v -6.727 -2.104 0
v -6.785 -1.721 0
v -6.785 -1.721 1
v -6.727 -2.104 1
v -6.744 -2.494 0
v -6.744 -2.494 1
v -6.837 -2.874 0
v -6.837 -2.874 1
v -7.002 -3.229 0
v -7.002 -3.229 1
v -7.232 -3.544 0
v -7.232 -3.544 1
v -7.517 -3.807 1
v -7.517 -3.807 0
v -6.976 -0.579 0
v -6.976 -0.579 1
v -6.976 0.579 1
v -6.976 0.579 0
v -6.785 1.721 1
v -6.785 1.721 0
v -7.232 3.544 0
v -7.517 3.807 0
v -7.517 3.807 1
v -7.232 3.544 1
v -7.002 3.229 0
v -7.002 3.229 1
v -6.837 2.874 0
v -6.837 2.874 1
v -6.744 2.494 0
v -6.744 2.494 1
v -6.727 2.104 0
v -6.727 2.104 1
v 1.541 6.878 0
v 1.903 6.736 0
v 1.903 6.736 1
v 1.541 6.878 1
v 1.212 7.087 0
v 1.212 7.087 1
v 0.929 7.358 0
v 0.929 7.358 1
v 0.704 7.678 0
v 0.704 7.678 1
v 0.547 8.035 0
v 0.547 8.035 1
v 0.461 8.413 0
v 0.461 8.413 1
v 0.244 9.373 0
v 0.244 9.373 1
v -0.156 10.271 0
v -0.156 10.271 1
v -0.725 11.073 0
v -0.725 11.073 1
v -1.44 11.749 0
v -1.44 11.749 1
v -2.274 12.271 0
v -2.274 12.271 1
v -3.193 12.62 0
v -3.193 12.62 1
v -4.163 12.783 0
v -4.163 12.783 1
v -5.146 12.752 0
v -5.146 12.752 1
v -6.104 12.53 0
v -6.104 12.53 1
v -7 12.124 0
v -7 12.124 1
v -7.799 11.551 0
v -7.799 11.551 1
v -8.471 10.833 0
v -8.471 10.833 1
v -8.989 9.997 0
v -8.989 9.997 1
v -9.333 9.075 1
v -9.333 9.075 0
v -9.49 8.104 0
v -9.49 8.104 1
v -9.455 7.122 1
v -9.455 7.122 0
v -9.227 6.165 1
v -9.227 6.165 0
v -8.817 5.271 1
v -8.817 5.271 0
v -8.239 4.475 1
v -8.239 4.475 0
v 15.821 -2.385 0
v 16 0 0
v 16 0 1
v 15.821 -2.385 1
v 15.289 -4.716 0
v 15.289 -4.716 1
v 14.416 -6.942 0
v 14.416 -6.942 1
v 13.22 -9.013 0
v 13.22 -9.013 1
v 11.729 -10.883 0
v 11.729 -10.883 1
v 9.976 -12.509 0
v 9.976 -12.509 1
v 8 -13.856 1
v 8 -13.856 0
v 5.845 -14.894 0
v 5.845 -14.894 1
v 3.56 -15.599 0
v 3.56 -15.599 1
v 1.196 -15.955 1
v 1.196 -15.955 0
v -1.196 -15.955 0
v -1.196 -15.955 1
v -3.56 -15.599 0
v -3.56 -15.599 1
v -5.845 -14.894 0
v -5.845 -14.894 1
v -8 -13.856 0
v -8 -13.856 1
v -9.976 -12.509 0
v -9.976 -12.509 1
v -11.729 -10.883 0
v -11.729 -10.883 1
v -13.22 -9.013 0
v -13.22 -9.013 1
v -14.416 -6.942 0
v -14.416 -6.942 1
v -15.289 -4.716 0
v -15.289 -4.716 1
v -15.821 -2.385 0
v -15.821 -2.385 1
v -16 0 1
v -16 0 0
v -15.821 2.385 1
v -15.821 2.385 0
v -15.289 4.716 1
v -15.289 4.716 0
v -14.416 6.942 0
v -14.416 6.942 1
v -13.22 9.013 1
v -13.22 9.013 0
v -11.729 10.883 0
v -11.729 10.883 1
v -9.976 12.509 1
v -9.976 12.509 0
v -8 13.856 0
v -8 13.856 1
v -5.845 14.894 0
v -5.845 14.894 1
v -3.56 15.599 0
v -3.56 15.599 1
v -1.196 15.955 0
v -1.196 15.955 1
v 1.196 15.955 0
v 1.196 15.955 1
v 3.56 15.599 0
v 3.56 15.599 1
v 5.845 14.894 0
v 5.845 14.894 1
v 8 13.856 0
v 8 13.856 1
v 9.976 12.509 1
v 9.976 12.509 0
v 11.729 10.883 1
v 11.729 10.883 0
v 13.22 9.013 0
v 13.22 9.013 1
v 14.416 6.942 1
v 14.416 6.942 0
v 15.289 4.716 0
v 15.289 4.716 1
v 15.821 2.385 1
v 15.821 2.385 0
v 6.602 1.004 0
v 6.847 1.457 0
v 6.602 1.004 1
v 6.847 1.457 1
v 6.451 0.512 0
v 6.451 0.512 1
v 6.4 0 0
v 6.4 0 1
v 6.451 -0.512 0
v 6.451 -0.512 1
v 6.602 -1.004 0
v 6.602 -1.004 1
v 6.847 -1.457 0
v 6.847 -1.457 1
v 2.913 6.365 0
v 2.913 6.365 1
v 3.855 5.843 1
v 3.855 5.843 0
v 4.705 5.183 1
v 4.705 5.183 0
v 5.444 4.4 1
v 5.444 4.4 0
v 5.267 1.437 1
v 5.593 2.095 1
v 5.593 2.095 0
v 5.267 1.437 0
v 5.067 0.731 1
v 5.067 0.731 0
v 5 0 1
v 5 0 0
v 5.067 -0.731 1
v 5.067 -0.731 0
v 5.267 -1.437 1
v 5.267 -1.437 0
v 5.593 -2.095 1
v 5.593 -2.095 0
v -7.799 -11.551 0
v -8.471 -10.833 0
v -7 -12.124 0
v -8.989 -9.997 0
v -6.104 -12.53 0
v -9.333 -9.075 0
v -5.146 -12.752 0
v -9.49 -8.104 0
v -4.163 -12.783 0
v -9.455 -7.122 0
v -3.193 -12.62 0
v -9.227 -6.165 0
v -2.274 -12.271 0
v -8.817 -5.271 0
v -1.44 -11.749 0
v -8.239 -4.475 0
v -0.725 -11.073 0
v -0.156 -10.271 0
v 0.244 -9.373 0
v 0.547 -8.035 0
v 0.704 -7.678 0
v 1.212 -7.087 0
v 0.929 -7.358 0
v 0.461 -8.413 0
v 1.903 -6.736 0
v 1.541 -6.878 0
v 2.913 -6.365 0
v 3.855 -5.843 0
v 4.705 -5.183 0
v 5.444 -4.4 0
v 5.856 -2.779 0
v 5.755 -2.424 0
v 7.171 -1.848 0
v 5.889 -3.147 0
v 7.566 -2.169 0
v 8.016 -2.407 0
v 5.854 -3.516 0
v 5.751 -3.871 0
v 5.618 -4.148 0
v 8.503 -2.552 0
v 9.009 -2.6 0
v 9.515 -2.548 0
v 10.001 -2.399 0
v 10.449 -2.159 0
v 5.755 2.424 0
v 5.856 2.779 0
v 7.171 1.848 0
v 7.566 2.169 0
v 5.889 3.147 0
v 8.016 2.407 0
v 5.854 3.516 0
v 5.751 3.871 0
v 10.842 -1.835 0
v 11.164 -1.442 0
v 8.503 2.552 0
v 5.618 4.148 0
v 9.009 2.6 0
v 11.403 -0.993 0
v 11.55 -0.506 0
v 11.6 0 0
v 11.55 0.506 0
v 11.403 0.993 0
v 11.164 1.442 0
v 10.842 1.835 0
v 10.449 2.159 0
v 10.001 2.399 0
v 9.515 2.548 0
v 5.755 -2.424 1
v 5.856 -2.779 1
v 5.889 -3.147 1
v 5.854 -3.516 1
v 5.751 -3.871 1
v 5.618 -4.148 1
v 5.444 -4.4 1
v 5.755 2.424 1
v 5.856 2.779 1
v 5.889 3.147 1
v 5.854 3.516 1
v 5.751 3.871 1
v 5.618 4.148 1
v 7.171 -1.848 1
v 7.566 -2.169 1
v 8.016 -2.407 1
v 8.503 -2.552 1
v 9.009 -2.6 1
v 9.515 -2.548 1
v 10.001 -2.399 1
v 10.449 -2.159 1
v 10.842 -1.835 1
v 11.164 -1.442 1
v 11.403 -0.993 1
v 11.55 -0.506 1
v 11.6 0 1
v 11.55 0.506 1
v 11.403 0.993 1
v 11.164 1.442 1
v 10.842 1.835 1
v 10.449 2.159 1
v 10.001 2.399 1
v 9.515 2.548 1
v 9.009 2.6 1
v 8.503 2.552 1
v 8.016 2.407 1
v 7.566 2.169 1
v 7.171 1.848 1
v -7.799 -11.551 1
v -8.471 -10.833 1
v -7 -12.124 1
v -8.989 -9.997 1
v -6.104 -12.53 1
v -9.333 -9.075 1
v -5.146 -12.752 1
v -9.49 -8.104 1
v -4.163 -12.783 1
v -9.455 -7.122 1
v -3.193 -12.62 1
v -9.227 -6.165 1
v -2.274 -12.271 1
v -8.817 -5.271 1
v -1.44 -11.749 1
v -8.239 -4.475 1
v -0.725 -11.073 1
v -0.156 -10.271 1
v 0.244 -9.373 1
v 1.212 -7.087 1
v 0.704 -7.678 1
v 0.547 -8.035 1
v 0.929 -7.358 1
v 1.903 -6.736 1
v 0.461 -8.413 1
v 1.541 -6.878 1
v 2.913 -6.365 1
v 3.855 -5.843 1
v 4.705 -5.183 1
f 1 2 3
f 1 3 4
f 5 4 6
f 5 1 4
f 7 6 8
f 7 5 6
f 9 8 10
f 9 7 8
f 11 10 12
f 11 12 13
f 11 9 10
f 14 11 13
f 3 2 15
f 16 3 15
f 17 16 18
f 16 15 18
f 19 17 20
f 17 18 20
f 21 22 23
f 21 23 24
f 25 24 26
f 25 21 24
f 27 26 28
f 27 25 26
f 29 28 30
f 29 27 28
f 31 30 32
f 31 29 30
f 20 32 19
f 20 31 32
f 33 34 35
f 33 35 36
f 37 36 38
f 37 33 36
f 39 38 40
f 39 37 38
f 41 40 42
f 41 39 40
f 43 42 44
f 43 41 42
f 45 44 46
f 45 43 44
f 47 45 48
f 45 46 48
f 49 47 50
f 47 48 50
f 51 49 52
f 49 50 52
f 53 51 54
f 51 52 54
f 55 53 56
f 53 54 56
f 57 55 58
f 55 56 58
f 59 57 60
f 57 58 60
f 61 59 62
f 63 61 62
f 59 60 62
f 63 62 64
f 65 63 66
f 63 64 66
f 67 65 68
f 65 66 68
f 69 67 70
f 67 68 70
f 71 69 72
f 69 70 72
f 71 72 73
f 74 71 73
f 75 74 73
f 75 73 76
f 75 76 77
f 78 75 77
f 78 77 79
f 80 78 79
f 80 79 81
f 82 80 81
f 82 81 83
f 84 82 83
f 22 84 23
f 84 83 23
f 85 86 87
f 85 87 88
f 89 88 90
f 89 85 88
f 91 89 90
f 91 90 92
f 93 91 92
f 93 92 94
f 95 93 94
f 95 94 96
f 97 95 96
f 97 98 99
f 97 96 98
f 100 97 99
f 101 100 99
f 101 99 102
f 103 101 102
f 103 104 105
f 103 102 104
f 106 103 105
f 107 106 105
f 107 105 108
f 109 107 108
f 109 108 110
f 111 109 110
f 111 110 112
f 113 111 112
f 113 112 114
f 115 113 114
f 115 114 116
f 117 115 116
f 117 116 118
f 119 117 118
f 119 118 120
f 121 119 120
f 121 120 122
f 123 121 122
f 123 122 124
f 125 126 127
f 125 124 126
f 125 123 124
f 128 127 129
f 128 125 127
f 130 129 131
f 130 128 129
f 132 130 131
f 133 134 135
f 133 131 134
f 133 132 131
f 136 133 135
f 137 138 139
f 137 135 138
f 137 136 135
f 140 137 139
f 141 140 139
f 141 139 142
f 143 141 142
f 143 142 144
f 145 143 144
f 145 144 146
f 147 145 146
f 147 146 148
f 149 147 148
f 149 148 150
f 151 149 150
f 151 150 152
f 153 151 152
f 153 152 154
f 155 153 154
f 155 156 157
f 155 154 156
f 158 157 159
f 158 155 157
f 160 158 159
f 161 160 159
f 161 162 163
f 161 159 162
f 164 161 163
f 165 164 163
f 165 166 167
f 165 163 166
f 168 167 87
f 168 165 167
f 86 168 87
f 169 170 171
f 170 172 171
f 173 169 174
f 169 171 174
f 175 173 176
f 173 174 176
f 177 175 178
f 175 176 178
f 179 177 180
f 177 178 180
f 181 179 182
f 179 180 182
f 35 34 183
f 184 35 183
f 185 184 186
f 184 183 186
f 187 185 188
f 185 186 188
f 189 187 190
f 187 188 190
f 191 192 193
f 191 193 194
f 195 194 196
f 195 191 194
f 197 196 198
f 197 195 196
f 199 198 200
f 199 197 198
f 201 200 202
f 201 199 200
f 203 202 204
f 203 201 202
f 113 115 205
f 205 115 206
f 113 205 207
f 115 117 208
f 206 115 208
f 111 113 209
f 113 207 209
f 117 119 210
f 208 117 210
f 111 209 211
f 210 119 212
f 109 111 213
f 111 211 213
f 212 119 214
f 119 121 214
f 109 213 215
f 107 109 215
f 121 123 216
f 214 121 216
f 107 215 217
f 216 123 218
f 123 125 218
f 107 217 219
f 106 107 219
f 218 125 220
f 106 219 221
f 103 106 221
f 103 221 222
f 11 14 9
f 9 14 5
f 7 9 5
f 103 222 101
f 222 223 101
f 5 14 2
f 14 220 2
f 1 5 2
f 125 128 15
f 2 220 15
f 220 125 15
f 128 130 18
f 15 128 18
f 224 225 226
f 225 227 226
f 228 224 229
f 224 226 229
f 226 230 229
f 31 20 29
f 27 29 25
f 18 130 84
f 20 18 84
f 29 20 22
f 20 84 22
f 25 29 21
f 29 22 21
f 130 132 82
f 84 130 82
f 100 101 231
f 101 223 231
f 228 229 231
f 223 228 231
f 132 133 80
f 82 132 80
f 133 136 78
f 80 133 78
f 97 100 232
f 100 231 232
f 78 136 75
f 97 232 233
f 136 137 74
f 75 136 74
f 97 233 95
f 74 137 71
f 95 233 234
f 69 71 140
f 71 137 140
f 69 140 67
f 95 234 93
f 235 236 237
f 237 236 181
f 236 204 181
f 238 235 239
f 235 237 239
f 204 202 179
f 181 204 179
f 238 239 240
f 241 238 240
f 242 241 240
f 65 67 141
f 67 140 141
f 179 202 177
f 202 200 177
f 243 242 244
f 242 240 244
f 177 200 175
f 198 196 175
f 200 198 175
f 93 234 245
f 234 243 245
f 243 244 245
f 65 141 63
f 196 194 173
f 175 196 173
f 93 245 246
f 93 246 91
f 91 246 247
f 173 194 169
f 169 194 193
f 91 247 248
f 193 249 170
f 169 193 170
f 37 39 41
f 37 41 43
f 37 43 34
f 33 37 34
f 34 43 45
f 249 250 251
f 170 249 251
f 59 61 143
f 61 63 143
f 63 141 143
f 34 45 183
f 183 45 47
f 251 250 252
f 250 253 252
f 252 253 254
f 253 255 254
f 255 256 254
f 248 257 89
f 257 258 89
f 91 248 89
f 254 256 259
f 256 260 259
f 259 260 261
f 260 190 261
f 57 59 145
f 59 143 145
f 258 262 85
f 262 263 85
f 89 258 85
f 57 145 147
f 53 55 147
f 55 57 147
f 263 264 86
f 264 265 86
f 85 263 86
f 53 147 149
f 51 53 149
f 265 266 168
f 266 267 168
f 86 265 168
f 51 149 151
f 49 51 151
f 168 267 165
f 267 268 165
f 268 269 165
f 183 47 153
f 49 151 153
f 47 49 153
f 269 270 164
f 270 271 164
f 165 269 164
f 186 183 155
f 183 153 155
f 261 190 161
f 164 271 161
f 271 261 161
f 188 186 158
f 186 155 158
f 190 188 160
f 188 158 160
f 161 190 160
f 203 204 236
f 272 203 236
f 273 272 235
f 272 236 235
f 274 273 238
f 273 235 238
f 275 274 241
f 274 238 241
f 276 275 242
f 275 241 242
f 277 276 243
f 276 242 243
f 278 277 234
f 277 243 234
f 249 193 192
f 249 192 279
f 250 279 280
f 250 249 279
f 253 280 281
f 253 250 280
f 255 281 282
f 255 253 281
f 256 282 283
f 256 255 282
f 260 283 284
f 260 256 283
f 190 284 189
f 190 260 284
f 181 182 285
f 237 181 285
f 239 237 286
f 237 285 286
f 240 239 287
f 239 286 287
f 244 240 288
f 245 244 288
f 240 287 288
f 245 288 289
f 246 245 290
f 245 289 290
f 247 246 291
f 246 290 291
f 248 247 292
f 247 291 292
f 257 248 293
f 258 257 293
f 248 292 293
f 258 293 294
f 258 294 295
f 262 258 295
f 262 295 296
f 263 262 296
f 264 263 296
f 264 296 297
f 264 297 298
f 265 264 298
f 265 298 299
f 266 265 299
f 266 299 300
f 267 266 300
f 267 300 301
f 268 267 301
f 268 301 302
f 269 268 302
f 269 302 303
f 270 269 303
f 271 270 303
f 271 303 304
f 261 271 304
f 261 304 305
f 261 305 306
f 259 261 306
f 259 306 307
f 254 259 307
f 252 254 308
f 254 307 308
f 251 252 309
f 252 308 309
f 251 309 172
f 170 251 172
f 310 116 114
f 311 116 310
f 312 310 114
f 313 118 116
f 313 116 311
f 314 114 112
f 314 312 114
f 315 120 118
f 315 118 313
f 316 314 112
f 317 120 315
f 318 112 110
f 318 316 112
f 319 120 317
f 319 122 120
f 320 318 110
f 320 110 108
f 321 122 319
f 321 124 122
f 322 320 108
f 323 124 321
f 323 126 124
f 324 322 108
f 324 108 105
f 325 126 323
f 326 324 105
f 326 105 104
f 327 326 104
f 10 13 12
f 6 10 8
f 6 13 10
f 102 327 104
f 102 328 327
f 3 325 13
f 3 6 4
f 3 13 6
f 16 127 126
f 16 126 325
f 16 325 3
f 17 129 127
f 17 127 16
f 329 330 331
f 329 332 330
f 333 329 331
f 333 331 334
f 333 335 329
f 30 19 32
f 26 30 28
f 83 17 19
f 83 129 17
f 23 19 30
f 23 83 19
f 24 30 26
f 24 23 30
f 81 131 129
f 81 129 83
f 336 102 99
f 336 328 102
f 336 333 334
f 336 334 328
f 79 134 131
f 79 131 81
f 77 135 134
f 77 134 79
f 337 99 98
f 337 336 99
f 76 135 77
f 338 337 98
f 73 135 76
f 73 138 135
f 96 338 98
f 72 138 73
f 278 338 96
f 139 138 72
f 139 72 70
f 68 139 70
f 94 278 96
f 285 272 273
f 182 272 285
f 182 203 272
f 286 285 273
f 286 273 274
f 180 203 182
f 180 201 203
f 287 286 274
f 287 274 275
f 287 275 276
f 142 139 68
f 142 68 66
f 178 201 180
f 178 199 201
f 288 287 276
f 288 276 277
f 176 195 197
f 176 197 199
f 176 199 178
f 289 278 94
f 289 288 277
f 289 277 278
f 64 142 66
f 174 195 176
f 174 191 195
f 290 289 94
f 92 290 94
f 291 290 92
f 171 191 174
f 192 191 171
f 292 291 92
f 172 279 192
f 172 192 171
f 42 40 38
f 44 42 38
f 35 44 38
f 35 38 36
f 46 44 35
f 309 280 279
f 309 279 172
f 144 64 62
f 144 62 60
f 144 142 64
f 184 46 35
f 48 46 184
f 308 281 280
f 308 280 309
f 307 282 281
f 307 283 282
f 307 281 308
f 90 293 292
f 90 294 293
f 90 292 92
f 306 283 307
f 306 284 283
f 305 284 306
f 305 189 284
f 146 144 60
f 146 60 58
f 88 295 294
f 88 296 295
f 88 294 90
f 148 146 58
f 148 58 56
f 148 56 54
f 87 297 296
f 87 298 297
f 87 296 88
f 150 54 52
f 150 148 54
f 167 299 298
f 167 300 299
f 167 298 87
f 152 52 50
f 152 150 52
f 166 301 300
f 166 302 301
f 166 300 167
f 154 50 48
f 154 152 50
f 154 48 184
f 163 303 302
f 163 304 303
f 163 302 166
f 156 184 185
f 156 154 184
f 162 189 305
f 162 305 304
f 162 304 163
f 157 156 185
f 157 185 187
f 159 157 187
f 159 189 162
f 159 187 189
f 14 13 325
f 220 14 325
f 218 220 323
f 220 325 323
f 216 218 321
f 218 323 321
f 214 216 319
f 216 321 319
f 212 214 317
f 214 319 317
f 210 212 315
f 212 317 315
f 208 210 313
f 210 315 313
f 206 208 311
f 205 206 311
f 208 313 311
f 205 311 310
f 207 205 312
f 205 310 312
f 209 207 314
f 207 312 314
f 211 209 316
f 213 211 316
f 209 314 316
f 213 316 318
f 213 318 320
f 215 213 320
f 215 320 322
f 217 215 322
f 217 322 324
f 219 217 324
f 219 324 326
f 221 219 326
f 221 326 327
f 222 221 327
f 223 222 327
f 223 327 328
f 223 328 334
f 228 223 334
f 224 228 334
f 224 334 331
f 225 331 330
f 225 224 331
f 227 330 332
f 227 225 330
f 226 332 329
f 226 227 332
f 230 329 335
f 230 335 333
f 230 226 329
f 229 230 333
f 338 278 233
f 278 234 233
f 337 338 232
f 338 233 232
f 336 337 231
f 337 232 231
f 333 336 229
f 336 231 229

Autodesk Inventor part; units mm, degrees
ref_plane "YZ Plane" through (0, 0, 0) normal (1, 0, 0) x (0, 1, 0)
ref_plane "XZ Plane" through (0, 0, 0) normal (0, 1, 0) x (-1, 0, 0)
ref_plane "XY Plane" through (0, 0, 0) normal (0, 0, 1) x (1, 0, 0)
sketch "Sketch1" plane through (0, 0, 0) normal (0, 0, 1) x (1, 0, 0)
  circle A0 centre (0, 0) radius 7
  circle A1 centre (0, 0) radius 16
  dimension "d0" = 32
  dimension "d1" = 14
extrude "Extrusion1" add sketch "Sketch1" along normal blind 1
sketch "Sketch2" plane through (0, 0, 1) normal (0, 0, 1) x (1, 0, 0)
  circle A0 centre (9, 0) radius 2.6
  point P0 (0, 0)
  dimension "d4" = 9
  dimension "d5" = 5.2
extrude "Extrusion2" cut sketch "Sketch2" against normal blind 1
pattern_circular "Circular Pattern1" count 3 over 360 about axis through (0, 0, 0) along (0, 0, 1) of "Extrusion2"
sketch "Sketch4" plane through (0, 0, 1) normal (0, 0, 1) x (1, 0, 0)
  arc A0 (-2.1614, 6.6579) -> (-4.6852, 5.2008) centre (-4.5, 7.7942) ccw projected
  circle A1 centre (-4.5, 7.7942) radius 5
  arc A2 (-4.6852, -5.2008) -> (-2.1614, -6.6579) centre (-4.5, -7.7942) ccw projected
  circle A3 centre (-4.5, -7.7942) radius 5
  point P0 (0, 0)
  dimension "d12" = 10
extrude "Extrusion3" cut sketch "Sketch4" against normal through all
sketch "Sketch5" plane through (0, 0, 1) normal (0, 0, 1) x (1, 0, 0)
  arc A0 (6.8467, -1.4571) -> (6.8467, 1.4571) centre (9, 0) ccw projected
  circle A1 centre (9, 0) radius 4
  circle A2 centre (9, 0) radius 2.6
  point P0 (0, 0)
  point P1 (6.8467, 1.4571)
  dimension "d16" = 8
extrude "Extrusion4" add sketch "Sketch5" against normal up to surface (1 mm away)
fillet "Fillet3" radius 2 6 edges at (0.4343, 6.9865, 0.5) (-6.2677, 3.1171, 0.5) (-6.2677, -3.1171, 0.5) (0.4343, -6.9865, 0.5) (6.3333, -2.9814, 0.5) (6.3333, 2.9814, 0.5)
properties part number "ring-pre-anode" material "Stainless Steel"
